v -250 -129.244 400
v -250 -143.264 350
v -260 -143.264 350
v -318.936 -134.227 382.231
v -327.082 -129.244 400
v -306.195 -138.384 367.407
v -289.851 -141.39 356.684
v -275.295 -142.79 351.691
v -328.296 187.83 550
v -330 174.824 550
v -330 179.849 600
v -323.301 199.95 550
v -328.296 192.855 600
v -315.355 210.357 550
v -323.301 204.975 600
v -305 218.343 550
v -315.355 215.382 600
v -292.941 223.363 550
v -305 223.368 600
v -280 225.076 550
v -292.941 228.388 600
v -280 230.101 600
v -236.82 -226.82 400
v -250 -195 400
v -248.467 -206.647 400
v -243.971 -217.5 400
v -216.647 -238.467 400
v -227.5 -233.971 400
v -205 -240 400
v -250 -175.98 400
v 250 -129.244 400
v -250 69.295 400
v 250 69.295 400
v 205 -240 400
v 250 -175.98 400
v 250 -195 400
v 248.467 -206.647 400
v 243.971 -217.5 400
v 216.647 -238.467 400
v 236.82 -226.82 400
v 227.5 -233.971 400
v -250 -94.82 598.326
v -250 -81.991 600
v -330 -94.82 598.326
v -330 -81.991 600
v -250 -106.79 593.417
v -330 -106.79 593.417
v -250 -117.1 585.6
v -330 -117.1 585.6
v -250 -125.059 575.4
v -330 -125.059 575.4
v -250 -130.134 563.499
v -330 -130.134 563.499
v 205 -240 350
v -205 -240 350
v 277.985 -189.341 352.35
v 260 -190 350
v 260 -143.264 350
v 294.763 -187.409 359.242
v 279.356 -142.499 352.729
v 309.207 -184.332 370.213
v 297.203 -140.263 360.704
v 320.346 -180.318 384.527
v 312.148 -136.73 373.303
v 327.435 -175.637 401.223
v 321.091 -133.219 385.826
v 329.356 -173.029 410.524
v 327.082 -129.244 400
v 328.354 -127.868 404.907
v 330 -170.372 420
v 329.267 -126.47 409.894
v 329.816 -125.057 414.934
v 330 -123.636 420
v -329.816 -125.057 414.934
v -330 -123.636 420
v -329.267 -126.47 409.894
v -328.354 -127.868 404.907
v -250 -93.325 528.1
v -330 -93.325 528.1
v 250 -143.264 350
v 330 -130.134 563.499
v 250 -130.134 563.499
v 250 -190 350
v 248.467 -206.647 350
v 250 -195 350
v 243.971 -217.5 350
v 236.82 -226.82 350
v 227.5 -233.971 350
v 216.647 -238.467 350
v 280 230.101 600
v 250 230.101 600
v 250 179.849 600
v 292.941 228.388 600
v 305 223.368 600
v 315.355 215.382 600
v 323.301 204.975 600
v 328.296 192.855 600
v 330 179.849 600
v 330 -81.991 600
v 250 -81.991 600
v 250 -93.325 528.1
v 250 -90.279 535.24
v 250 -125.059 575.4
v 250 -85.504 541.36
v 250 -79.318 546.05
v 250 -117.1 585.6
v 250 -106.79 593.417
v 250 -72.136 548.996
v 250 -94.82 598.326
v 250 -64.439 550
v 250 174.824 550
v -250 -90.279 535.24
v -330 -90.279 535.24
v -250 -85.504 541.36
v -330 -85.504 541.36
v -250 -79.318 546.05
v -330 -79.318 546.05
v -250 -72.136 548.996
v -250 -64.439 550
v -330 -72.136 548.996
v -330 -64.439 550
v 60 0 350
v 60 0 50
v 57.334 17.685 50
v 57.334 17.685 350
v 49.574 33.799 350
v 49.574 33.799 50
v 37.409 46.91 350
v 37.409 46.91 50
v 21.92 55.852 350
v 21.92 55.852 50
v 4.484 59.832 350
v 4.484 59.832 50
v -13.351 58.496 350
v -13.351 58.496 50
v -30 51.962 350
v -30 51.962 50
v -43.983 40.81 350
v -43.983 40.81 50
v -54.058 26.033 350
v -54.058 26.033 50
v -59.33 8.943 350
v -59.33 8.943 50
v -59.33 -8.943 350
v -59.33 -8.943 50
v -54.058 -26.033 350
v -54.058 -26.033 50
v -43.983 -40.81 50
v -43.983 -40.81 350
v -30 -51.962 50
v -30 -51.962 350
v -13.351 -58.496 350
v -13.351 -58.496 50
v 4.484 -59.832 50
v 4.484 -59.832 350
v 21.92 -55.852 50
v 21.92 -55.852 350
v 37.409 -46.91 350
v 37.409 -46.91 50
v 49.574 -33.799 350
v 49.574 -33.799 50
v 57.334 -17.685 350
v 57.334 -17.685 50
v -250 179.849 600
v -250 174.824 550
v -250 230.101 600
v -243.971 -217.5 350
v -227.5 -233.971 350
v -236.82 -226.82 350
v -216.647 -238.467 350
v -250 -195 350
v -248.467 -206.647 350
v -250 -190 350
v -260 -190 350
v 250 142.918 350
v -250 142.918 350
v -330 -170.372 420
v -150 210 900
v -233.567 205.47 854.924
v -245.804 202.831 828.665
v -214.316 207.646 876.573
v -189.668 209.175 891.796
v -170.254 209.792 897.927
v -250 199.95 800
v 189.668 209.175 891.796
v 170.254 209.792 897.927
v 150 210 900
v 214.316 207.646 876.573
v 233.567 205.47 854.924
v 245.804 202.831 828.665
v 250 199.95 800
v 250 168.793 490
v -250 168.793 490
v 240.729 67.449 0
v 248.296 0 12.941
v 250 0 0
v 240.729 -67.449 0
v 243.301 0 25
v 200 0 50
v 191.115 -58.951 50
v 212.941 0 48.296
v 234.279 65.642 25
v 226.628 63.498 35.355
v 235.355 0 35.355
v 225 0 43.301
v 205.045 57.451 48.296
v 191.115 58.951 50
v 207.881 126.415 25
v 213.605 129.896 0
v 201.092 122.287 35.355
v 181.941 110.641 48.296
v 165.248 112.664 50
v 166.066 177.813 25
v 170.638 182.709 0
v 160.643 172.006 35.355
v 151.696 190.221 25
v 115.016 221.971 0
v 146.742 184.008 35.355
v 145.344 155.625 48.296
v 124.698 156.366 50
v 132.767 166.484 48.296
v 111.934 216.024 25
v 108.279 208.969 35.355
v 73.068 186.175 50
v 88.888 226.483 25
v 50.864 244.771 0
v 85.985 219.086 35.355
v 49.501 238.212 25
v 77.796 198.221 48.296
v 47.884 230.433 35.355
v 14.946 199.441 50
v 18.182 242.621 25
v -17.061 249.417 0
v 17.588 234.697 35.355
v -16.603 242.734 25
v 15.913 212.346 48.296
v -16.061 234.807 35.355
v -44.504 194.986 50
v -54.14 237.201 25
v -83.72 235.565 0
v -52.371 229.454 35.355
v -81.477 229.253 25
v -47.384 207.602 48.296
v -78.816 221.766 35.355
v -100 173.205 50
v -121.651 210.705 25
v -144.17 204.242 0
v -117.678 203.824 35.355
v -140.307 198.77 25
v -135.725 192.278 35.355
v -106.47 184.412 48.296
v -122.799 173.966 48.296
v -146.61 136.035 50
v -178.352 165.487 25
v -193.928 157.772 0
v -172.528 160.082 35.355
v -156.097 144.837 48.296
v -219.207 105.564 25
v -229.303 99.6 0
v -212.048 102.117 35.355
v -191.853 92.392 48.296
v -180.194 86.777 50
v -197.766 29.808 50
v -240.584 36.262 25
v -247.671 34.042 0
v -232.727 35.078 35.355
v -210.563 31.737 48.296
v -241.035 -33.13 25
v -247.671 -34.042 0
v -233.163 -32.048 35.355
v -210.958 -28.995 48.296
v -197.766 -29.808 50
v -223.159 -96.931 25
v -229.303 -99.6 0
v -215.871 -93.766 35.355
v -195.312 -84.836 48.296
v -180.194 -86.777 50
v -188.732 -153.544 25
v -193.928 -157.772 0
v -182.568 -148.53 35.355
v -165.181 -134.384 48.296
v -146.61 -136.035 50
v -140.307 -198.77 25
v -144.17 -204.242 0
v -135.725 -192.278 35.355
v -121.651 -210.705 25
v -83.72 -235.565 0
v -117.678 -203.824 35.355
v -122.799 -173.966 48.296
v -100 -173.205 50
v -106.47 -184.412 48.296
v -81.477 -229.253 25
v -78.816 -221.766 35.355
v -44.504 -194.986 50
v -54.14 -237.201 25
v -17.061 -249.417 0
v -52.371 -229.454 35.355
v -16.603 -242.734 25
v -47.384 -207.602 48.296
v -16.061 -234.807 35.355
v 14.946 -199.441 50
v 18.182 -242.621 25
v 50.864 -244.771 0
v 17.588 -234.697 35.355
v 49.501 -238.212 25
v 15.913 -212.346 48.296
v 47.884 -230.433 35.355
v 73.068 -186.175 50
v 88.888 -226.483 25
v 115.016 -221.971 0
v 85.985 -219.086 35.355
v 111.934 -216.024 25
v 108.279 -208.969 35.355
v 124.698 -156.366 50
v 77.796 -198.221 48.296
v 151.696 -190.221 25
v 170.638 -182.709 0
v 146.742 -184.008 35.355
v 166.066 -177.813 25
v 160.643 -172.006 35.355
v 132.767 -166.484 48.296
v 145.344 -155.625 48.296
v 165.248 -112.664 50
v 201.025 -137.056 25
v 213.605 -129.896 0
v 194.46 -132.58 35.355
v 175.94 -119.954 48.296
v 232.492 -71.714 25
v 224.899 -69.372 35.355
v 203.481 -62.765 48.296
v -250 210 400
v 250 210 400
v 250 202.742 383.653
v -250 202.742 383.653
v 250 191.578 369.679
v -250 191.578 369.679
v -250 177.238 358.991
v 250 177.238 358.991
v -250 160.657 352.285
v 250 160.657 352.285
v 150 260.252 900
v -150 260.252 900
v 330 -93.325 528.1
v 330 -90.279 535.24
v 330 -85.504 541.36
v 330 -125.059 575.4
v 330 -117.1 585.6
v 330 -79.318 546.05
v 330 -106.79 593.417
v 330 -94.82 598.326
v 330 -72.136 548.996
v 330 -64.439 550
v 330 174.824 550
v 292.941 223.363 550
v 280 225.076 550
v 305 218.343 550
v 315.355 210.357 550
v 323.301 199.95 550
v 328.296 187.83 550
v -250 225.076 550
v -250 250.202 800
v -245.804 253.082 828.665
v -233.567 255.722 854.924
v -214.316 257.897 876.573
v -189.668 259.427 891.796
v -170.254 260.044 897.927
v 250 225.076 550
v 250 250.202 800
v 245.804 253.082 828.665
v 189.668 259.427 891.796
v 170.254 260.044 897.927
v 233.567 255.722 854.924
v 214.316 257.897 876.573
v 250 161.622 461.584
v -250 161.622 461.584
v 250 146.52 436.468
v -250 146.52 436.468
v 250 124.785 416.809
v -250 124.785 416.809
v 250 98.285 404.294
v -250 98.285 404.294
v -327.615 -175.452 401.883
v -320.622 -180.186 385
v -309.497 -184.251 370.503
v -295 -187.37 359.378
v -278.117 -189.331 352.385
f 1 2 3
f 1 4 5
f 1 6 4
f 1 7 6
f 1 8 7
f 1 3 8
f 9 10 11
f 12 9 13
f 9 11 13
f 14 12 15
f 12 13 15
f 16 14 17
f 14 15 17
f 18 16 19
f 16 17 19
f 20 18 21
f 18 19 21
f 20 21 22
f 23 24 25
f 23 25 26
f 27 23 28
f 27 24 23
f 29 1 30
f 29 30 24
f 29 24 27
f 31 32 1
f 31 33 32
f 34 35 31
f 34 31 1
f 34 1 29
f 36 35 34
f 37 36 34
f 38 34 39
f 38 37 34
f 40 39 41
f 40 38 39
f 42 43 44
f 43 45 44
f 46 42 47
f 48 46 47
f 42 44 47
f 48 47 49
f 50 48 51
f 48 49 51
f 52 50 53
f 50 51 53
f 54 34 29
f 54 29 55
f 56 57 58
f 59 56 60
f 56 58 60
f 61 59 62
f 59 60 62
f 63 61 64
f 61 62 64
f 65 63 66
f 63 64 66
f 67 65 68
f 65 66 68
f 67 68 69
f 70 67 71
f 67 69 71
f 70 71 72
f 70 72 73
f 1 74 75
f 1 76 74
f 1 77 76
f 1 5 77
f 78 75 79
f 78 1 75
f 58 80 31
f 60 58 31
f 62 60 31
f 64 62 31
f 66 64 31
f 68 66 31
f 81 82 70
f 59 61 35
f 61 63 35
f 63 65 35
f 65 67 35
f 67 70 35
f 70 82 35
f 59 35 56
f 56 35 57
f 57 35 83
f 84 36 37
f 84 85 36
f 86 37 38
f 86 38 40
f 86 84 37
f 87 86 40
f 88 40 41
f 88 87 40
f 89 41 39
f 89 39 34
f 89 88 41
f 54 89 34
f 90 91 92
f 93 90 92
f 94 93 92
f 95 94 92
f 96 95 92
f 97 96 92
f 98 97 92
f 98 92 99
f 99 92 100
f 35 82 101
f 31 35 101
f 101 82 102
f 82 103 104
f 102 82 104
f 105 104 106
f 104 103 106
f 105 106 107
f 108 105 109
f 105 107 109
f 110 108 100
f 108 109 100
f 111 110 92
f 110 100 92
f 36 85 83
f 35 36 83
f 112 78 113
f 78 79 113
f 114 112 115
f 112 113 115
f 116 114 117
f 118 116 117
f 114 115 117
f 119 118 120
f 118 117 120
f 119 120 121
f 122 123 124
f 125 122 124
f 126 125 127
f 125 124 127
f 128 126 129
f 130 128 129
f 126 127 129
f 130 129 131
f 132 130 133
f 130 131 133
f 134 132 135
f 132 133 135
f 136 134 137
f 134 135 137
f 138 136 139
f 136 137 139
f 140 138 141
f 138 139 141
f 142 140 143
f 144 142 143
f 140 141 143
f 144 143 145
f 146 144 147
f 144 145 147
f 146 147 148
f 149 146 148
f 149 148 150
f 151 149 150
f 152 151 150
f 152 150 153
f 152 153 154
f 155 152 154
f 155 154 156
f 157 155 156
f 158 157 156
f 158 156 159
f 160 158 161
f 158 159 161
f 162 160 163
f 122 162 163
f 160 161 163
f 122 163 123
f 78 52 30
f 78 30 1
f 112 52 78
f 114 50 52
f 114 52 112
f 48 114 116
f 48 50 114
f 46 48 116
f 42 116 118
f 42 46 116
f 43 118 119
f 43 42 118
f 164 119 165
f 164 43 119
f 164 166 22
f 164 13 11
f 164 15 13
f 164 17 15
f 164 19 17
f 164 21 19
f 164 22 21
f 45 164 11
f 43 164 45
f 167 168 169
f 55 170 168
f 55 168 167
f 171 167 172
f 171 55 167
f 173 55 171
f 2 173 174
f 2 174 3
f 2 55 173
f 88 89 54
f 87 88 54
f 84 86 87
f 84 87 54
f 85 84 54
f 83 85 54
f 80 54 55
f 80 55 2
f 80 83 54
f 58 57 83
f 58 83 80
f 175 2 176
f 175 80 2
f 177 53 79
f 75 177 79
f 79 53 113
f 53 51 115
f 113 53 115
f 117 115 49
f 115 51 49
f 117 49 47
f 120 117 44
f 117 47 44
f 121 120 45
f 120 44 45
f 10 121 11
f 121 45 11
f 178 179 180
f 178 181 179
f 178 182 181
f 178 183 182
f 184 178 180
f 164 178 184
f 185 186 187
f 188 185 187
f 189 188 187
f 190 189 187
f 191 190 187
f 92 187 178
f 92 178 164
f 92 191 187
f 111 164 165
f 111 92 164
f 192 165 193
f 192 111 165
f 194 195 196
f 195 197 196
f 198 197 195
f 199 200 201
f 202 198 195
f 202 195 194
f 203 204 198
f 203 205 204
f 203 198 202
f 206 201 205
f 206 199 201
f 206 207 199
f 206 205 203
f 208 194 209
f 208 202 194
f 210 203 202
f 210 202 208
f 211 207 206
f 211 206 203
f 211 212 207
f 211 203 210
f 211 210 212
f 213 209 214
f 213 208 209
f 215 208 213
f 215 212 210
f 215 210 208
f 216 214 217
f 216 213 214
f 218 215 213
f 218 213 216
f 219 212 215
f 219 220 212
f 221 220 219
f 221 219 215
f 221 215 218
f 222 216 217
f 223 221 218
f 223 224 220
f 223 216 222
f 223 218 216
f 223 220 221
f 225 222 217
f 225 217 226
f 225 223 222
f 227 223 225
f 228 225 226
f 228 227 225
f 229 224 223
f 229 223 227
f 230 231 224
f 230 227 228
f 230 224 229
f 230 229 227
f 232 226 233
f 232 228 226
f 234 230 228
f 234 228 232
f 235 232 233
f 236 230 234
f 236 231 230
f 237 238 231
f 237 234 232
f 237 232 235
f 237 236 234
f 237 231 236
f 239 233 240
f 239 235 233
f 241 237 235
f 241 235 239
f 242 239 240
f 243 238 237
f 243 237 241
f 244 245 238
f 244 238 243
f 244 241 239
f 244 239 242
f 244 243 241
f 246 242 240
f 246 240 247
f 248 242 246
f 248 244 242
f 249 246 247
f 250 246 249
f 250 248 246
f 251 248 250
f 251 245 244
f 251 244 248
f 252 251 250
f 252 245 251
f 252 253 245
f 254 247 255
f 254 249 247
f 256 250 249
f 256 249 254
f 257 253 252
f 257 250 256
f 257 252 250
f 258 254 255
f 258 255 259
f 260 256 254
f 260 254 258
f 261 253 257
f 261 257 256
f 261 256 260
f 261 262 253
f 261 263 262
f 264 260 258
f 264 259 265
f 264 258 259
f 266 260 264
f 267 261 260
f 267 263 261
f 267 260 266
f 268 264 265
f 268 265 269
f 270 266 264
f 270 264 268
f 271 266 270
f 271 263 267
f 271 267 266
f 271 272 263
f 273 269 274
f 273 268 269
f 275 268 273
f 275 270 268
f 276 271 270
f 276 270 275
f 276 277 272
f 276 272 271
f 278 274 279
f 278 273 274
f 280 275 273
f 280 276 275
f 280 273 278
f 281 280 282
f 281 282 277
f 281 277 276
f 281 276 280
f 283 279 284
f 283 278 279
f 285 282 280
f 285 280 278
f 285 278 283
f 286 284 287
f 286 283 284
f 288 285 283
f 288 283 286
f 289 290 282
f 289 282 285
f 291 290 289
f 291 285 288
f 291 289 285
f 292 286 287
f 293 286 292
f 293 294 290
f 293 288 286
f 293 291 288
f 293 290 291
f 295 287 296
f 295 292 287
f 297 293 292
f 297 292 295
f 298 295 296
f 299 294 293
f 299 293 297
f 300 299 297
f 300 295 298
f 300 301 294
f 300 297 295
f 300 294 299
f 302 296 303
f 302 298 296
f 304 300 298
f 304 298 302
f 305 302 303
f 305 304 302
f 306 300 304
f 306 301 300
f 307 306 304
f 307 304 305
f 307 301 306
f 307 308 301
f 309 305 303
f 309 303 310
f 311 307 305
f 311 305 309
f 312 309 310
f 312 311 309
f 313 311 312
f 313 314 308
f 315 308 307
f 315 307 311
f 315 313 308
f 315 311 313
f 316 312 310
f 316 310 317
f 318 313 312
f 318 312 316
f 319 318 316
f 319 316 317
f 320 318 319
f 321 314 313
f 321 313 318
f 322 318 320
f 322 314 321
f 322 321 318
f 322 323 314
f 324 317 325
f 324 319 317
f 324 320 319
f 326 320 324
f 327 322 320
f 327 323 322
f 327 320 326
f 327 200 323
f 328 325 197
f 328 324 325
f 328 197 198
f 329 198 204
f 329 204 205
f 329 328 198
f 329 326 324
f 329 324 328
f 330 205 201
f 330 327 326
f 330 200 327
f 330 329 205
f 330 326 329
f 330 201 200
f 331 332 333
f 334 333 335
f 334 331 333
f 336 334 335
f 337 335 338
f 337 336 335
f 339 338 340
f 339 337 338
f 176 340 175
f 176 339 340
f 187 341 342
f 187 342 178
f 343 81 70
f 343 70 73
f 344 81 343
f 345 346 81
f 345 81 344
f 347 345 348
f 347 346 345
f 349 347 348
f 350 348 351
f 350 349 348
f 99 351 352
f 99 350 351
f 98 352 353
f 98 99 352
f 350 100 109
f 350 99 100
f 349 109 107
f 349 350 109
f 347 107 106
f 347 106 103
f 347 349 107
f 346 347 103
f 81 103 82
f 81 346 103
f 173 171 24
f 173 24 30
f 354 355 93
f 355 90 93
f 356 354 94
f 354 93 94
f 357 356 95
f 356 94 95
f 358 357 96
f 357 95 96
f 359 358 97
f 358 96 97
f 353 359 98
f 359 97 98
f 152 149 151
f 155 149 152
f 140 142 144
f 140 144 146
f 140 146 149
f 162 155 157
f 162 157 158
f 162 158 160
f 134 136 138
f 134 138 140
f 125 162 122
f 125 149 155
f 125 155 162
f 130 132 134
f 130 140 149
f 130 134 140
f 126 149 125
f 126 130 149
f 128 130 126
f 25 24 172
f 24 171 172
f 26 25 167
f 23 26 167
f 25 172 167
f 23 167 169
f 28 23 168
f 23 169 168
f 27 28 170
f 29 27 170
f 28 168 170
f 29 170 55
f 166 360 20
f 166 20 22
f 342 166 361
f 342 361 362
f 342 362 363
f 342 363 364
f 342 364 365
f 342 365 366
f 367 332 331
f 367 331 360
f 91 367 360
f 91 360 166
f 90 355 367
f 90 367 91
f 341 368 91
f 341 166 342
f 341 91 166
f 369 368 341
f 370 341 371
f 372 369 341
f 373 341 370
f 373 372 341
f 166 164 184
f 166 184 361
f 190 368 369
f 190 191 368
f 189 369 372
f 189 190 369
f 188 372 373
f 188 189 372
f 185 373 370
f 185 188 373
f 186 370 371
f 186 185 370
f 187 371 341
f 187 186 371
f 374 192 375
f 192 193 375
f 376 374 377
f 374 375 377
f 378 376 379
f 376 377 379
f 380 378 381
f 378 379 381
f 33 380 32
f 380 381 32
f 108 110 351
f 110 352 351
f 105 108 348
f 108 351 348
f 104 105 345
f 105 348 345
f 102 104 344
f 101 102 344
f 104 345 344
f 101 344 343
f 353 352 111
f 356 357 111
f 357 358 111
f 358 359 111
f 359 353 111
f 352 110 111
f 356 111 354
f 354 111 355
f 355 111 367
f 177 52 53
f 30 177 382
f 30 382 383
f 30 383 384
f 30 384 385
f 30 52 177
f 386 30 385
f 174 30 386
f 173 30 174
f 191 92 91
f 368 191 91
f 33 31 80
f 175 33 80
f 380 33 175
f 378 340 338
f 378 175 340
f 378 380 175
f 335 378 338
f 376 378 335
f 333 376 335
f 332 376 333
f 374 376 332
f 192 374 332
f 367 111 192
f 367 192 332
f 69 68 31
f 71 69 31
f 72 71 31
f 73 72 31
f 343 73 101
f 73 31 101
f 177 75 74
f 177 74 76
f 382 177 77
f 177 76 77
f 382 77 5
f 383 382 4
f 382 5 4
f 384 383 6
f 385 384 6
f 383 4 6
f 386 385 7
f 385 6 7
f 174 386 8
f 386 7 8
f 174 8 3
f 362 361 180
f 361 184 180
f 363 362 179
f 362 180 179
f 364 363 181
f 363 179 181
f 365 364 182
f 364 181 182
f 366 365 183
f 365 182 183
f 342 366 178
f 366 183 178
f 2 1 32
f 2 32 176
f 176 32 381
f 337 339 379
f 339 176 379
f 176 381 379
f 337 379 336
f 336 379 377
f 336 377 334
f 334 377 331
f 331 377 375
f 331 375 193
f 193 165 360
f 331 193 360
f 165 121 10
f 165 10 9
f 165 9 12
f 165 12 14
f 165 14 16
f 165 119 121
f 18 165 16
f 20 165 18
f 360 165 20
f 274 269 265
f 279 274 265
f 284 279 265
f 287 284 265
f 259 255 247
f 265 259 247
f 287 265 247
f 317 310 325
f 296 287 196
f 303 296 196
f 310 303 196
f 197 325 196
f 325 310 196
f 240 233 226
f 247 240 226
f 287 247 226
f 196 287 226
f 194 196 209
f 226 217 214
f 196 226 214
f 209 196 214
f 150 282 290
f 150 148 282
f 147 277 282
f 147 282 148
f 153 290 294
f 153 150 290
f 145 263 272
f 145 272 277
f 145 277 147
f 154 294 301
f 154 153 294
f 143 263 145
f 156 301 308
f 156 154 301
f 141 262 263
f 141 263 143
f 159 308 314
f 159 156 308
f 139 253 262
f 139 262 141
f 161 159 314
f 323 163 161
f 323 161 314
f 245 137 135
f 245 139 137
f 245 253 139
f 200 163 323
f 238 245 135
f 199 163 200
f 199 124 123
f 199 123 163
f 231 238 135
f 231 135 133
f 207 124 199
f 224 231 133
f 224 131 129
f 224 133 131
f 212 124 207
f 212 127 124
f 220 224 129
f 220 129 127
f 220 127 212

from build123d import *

# Parameters (mm, degrees)
F0_R         = 250
F1_DEPTH     = 50
F2_R         = 60
F3_DEPTH     = 300
F5_DEPTH     = 250
F7_DEPTH     = 80
F9_R         = 45
F10_R        = 100
F11_R        = 100
F12_T1_DEPTH = 835.410196625
F13_R        = 50
F14_R        = 30
F15_R        = 70
F16_R        = 50
F17_R        = 49.99999


# Not quite as in the source:
# - a fillet or chamfer that OpenCascade refuses, or shapes differently, is made with other operations: its cross-section is extruded or revolved along the edge and cut away or added
# - a fillet or chamfer is up to 0.001 mm smaller than in the source, because OpenCascade refuses the exact size


with BuildPart() as f1:
    # F0 (on Top) → F1 (new body)
    with BuildSketch(Plane.XY):
        Circle(F0_R)
    extrude(amount=F1_DEPTH)

    # F2 (on face) → F3 (join)
    with BuildSketch(Plane.XY.offset(50)):
        Circle(F2_R)
    extrude(amount=F3_DEPTH)

    # F17 (radius 50 in the source; OpenCascade refuses exactly that, so slightly less here)
    f17_edges = [f1.edges().sort_by_distance(p)[0] for p in [
        (-250, 0, 50),
    ]]
    fillet(f17_edges, radius=F17_R)


with BuildPart() as f5:
    # F4 (on Right) → F5 (new body, symmetric)
    with BuildSketch(Plane.YZ):
        Polygon((159.748109237, 400), (-240, 400), (-240, 350), (210, 350), (210, 400), (260.251890763, 900), (210, 900), align=None)
    extrude(amount=F5_DEPTH, both=True)

    # F6 (on face) → F7 (join)
    with BuildSketch(Plane.YZ.offset(250)):
        Polygon((225.0755672289, 550), (230.1007563052, 600), (179.8488655422, 600), (174.8236764659, 550), align=None)
        Polygon((-129.2442374825, 400), (-175.979848739, 400), (-190, 350), (-143.2643887435, 350), align=None)
        Polygon((174.8236764659, 550), (179.8488655422, 600), (-119.8992436948, 600), (-175.979848739, 400), (-129.2442374825, 400), (-87.1837836993, 550), align=None)
    extrude(amount=F7_DEPTH)

    # F8: F5 across plane


with BuildPart() as f5_1:
    add(f5.part)
    add(f5.part.mirror(Plane.YZ))

    # F9
    f9_edges = [f5_1.edges().sort_by_distance(p)[0] for p in [
        (250, -240, 375),
        (-250, -240, 375),
    ]]
    fillet(f9_edges, radius=F9_R)

    # F10
    f10_edges = [f5_1.edges().sort_by_distance(p)[0] for p in [
        (250, 235.125945, 900),
        (-250, 235.125945, 900),
    ]]
    fillet(f10_edges, radius=F10_R)

    # F11
    f11_edges = [f5_1.edges().sort_by_distance(p)[0] for p in [
        (0, 159.748109, 400),
    ]]
    fillet(f11_edges, radius=F11_R)

    # F12: fillet of radius 70 on 1 edges, made by hand

    # F12_s2 → F12_t1 (cut)
    with BuildSketch(Plane.YZ.offset(-417.7050983125)):
        with BuildLine():
            ThreePointArc((210, 400), (184.7509620017, 363.8751391984), (142.917960675, 350))
            Line((142.917960675, 350), (210, 350))
            Line((210, 350), (210, 400))
        make_face()
    extrude(amount=F12_T1_DEPTH, mode=Mode.SUBTRACT)

    # F13
    f13_edges = [f5_1.edges().sort_by_distance(p)[0] for p in [
        (290, -119.899244, 600),
        (-290, -119.899244, 600),
    ]]
    fillet(f13_edges, radius=F13_R)

    # F14
    f14_edges = [f5_1.edges().sort_by_distance(p)[0] for p in [
        (290, -87.183784, 550),
        (-290, -87.183784, 550),
    ]]
    fillet(f14_edges, radius=F14_R)

    # F15
    f15_edges = [f5_1.edges().sort_by_distance(p)[0] for p in [
        (330, -166.632194, 350),
        (-330, -166.632194, 350),
    ]]
    fillet(f15_edges, radius=F15_R)

    # F16
    f16_edges = [f5_1.edges().sort_by_distance(p)[0] for p in [
        (330, 227.588162, 575),
        (-330, 227.588162, 575),
    ]]
    fillet(f16_edges, radius=F16_R)


solid = Compound([f1.part, f5_1.part])
